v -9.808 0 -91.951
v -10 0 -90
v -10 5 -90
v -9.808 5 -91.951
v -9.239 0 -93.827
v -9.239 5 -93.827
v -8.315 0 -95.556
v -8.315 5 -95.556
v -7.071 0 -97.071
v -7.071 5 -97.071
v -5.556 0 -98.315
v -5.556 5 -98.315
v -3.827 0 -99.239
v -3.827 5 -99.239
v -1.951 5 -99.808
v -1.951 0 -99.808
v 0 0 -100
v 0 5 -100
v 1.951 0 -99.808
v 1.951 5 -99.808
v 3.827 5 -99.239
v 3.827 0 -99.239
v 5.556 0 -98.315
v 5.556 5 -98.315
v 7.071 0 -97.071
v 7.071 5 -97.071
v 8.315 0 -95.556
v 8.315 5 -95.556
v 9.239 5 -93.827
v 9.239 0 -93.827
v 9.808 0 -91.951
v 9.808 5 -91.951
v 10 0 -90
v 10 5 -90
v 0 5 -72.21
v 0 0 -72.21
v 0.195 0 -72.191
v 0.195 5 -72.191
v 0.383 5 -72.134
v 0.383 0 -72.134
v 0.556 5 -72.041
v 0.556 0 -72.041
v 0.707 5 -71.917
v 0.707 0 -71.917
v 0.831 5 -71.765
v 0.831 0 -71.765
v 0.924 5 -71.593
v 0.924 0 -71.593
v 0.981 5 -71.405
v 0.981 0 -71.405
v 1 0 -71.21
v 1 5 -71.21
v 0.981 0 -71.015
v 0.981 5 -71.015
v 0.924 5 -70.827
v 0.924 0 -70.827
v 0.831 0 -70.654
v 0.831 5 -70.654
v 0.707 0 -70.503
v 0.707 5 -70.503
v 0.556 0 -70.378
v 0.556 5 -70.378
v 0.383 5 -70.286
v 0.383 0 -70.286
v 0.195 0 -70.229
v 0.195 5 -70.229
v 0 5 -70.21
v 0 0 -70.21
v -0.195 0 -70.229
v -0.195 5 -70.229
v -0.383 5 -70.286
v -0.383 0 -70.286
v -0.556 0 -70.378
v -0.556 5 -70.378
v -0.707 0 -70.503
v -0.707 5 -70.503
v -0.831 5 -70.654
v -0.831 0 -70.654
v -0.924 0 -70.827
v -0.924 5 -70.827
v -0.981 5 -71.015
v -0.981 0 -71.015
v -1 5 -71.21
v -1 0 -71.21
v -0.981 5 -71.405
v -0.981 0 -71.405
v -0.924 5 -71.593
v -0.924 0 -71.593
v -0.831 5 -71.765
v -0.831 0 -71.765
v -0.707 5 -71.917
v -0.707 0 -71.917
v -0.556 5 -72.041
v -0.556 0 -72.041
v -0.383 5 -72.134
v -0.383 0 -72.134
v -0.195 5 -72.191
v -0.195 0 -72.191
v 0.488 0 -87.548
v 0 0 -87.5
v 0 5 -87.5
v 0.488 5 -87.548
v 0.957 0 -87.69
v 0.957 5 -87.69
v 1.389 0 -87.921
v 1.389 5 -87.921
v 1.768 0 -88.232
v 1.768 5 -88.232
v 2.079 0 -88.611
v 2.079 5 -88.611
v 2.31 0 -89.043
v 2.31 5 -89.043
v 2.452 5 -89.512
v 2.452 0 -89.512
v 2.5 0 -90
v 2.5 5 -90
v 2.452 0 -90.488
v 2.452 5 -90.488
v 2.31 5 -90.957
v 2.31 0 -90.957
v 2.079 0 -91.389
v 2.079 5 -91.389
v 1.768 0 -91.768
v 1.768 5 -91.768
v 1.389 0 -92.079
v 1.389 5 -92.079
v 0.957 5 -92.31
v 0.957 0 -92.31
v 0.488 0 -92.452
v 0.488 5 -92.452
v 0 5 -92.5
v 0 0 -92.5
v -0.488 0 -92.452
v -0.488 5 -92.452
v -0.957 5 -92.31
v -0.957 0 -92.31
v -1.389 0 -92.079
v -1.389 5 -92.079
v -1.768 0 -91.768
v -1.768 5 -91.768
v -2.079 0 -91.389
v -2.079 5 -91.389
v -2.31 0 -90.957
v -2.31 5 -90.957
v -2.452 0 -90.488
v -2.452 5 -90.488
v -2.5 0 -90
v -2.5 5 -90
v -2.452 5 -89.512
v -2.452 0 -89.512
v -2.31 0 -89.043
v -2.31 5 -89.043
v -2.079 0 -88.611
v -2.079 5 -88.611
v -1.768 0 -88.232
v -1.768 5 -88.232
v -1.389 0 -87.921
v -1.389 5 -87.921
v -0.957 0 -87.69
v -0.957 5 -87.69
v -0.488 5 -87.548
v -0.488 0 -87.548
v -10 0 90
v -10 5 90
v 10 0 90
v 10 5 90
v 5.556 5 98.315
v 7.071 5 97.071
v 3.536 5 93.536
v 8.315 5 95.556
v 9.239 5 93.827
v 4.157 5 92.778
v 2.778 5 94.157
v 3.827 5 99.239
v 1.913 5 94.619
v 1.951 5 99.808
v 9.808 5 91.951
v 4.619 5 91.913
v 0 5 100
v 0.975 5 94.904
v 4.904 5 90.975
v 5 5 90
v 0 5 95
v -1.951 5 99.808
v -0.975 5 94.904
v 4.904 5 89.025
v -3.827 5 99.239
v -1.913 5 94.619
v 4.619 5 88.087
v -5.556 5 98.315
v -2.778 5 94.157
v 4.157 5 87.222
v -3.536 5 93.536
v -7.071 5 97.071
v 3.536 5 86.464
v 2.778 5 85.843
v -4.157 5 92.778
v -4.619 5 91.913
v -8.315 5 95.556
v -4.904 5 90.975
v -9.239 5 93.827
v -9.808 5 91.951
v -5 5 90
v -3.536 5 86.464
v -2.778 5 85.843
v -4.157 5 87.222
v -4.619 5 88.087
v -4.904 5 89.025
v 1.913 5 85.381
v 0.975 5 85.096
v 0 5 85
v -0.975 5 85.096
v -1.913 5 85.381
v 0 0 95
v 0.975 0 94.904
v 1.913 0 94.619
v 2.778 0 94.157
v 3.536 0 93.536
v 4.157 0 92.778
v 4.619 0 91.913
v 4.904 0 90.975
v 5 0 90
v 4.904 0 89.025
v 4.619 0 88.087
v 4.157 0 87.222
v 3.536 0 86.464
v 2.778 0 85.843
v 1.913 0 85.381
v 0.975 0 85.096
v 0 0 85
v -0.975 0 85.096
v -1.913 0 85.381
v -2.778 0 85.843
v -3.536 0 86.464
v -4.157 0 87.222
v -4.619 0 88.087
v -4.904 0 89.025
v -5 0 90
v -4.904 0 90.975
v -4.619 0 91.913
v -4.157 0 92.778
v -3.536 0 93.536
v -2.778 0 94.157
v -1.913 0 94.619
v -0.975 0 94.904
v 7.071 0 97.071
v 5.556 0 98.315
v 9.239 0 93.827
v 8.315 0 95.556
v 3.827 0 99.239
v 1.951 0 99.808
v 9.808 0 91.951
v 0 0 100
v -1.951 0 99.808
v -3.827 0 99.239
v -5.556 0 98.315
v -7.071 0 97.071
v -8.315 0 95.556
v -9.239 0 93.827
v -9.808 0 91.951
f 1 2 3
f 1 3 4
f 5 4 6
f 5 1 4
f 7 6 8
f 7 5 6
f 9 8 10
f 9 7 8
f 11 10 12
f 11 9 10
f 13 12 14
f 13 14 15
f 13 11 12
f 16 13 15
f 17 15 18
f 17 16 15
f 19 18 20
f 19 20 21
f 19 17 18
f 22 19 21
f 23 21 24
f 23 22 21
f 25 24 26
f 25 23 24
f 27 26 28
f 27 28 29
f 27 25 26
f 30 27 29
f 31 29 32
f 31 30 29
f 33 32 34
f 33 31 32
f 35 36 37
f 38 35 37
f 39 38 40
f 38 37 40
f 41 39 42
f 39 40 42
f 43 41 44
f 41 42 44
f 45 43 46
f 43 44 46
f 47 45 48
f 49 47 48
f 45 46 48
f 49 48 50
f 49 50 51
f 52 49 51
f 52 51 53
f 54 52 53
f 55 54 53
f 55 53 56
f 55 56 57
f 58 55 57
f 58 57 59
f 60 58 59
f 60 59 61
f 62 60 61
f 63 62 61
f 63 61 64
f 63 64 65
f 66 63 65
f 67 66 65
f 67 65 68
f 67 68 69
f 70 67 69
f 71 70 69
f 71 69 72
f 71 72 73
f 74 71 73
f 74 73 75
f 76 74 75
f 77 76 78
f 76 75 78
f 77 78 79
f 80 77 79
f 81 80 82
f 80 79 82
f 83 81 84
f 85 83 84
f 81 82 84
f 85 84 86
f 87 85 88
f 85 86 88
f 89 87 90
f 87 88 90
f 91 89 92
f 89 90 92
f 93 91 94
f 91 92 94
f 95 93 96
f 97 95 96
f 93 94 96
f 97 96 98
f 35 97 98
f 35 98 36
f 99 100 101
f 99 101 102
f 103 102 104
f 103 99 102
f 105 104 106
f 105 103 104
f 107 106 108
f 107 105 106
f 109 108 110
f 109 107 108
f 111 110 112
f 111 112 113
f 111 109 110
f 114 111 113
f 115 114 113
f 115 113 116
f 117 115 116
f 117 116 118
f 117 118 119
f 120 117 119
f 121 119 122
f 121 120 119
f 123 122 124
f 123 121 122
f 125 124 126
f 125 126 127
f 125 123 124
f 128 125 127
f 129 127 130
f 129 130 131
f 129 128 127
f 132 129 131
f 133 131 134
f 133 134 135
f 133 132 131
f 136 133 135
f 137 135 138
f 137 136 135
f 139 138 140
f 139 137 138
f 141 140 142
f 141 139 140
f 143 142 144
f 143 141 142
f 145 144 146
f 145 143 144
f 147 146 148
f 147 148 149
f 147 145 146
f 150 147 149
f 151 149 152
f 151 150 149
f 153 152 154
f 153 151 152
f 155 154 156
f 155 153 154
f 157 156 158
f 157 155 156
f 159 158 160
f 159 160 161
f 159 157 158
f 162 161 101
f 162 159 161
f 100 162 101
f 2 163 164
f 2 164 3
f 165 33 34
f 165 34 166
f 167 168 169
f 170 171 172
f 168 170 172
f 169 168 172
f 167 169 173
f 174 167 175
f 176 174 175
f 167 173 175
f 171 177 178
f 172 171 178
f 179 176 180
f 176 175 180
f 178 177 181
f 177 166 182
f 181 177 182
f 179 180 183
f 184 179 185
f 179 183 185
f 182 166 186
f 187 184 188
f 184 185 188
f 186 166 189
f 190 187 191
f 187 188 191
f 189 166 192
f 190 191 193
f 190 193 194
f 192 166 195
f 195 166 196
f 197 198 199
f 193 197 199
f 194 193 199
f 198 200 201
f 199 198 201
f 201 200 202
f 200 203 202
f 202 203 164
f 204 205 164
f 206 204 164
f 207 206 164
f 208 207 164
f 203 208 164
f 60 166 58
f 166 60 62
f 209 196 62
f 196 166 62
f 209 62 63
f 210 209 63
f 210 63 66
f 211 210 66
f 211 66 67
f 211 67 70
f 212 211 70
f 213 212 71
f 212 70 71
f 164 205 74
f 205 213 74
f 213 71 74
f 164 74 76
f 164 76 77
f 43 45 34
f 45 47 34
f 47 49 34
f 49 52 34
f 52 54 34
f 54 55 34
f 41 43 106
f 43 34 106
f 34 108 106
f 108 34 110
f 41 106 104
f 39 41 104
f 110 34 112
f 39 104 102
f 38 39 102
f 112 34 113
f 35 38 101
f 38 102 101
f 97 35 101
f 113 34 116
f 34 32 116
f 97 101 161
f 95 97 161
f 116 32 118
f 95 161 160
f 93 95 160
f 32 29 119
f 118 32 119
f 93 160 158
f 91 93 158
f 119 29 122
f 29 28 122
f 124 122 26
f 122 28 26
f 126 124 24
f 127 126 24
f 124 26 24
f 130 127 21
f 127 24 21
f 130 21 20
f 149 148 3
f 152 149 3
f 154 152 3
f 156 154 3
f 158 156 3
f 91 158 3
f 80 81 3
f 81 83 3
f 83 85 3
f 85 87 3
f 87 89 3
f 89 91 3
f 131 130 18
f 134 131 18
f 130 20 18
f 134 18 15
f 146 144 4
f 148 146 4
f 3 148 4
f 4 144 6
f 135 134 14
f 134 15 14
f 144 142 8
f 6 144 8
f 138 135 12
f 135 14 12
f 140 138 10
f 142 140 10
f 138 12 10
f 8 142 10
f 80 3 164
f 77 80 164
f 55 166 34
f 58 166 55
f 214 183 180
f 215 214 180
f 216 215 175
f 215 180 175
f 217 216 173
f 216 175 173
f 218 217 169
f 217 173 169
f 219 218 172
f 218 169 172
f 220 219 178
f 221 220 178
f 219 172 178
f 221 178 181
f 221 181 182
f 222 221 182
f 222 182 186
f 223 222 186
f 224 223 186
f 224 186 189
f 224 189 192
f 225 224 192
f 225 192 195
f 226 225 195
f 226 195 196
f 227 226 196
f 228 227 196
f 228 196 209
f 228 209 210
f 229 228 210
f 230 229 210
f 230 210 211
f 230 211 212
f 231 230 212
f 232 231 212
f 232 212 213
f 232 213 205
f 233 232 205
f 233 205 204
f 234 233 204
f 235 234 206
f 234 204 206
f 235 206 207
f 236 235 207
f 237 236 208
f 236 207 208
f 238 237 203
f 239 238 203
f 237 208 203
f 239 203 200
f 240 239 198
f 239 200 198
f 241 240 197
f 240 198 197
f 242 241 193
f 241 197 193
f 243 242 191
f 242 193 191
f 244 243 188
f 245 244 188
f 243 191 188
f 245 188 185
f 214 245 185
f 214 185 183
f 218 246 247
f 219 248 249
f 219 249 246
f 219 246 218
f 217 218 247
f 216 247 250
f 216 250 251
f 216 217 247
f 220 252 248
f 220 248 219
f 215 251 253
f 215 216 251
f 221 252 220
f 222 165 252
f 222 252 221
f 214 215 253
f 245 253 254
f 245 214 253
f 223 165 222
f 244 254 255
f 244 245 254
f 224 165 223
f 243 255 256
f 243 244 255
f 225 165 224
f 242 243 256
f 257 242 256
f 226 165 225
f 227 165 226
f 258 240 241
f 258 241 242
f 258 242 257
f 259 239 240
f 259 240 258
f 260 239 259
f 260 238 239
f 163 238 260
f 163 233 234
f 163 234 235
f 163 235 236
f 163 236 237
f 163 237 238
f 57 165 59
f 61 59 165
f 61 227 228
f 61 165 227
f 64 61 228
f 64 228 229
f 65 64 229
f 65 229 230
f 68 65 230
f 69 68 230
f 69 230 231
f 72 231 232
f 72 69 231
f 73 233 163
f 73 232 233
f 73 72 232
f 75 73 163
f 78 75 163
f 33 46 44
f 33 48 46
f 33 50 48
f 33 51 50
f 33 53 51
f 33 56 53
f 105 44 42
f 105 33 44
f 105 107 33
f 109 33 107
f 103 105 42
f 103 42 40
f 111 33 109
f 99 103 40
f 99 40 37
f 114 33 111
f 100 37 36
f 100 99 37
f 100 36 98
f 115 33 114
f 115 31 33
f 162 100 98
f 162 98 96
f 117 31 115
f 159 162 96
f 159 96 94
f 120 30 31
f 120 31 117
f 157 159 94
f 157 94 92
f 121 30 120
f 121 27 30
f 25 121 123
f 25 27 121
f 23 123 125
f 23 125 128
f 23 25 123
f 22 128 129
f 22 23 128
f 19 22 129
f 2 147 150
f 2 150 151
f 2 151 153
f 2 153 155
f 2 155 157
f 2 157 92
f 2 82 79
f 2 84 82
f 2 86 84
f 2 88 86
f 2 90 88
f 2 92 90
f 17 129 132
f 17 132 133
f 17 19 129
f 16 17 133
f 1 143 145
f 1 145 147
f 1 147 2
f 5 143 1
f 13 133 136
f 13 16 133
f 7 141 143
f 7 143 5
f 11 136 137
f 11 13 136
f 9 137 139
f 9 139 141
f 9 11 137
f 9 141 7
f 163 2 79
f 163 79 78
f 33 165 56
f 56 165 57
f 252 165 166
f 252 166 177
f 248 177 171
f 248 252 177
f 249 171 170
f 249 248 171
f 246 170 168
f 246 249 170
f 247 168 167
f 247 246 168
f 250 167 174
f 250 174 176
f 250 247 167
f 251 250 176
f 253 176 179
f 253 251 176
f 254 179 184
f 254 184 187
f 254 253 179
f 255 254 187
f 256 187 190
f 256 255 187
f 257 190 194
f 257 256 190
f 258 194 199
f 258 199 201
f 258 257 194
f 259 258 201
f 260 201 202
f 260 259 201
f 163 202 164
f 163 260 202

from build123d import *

# Parameters (mm, degrees)
SKETCH1_R           = 2.5
BOSS_EXTRUDE1_DEPTH = 5
SKETCH2_R           = 1
CUT_EXTRUDE1_DEPTH  = 101.623058987
SKETCH3_R           = 5
BEARINGBORE_DEPTH   = 101.623058987


with BuildPart() as part:
    # Sketch1 → Boss-Extrude1 (new body)
    with BuildSketch(Plane(origin=(0, 0, 0), x_dir=(1, 0, 0), z_dir=(0, 1, 0))):
        with BuildLine():
            Line((-10, -90), (-10, 90))
            ThreePointArc((-10, 90), (0, 100), (10, 90))
            Line((10, 90), (10, -90))
            ThreePointArc((10, -90), (0, -100), (-10, -90))
        make_face()
        with Locations(Location((0, 90, 0), (0, 0, 270))):
            Circle(SKETCH1_R, mode=Mode.SUBTRACT)
    extrude(amount=BOSS_EXTRUDE1_DEPTH)

    # Sketch2 → Cut-Extrude1 (cut, through all)
    with BuildSketch(Plane.XZ):
        with Locations(Location((0, -71.209904471, 0), (0, 0, 270))):
            Circle(SKETCH2_R)
    extrude(amount=-CUT_EXTRUDE1_DEPTH, mode=Mode.SUBTRACT)

    # Sketch3 → BearingBore (cut, through all)
    with BuildSketch(Plane(origin=(0, 5, 0), x_dir=(1, 0, 0), z_dir=(0, 1, 0))):
        with Locations(Location((0, -90, 0), (0, 0, 270))):
            Circle(SKETCH3_R)
    extrude(amount=-BEARINGBORE_DEPTH, mode=Mode.SUBTRACT)


solid = part.part
